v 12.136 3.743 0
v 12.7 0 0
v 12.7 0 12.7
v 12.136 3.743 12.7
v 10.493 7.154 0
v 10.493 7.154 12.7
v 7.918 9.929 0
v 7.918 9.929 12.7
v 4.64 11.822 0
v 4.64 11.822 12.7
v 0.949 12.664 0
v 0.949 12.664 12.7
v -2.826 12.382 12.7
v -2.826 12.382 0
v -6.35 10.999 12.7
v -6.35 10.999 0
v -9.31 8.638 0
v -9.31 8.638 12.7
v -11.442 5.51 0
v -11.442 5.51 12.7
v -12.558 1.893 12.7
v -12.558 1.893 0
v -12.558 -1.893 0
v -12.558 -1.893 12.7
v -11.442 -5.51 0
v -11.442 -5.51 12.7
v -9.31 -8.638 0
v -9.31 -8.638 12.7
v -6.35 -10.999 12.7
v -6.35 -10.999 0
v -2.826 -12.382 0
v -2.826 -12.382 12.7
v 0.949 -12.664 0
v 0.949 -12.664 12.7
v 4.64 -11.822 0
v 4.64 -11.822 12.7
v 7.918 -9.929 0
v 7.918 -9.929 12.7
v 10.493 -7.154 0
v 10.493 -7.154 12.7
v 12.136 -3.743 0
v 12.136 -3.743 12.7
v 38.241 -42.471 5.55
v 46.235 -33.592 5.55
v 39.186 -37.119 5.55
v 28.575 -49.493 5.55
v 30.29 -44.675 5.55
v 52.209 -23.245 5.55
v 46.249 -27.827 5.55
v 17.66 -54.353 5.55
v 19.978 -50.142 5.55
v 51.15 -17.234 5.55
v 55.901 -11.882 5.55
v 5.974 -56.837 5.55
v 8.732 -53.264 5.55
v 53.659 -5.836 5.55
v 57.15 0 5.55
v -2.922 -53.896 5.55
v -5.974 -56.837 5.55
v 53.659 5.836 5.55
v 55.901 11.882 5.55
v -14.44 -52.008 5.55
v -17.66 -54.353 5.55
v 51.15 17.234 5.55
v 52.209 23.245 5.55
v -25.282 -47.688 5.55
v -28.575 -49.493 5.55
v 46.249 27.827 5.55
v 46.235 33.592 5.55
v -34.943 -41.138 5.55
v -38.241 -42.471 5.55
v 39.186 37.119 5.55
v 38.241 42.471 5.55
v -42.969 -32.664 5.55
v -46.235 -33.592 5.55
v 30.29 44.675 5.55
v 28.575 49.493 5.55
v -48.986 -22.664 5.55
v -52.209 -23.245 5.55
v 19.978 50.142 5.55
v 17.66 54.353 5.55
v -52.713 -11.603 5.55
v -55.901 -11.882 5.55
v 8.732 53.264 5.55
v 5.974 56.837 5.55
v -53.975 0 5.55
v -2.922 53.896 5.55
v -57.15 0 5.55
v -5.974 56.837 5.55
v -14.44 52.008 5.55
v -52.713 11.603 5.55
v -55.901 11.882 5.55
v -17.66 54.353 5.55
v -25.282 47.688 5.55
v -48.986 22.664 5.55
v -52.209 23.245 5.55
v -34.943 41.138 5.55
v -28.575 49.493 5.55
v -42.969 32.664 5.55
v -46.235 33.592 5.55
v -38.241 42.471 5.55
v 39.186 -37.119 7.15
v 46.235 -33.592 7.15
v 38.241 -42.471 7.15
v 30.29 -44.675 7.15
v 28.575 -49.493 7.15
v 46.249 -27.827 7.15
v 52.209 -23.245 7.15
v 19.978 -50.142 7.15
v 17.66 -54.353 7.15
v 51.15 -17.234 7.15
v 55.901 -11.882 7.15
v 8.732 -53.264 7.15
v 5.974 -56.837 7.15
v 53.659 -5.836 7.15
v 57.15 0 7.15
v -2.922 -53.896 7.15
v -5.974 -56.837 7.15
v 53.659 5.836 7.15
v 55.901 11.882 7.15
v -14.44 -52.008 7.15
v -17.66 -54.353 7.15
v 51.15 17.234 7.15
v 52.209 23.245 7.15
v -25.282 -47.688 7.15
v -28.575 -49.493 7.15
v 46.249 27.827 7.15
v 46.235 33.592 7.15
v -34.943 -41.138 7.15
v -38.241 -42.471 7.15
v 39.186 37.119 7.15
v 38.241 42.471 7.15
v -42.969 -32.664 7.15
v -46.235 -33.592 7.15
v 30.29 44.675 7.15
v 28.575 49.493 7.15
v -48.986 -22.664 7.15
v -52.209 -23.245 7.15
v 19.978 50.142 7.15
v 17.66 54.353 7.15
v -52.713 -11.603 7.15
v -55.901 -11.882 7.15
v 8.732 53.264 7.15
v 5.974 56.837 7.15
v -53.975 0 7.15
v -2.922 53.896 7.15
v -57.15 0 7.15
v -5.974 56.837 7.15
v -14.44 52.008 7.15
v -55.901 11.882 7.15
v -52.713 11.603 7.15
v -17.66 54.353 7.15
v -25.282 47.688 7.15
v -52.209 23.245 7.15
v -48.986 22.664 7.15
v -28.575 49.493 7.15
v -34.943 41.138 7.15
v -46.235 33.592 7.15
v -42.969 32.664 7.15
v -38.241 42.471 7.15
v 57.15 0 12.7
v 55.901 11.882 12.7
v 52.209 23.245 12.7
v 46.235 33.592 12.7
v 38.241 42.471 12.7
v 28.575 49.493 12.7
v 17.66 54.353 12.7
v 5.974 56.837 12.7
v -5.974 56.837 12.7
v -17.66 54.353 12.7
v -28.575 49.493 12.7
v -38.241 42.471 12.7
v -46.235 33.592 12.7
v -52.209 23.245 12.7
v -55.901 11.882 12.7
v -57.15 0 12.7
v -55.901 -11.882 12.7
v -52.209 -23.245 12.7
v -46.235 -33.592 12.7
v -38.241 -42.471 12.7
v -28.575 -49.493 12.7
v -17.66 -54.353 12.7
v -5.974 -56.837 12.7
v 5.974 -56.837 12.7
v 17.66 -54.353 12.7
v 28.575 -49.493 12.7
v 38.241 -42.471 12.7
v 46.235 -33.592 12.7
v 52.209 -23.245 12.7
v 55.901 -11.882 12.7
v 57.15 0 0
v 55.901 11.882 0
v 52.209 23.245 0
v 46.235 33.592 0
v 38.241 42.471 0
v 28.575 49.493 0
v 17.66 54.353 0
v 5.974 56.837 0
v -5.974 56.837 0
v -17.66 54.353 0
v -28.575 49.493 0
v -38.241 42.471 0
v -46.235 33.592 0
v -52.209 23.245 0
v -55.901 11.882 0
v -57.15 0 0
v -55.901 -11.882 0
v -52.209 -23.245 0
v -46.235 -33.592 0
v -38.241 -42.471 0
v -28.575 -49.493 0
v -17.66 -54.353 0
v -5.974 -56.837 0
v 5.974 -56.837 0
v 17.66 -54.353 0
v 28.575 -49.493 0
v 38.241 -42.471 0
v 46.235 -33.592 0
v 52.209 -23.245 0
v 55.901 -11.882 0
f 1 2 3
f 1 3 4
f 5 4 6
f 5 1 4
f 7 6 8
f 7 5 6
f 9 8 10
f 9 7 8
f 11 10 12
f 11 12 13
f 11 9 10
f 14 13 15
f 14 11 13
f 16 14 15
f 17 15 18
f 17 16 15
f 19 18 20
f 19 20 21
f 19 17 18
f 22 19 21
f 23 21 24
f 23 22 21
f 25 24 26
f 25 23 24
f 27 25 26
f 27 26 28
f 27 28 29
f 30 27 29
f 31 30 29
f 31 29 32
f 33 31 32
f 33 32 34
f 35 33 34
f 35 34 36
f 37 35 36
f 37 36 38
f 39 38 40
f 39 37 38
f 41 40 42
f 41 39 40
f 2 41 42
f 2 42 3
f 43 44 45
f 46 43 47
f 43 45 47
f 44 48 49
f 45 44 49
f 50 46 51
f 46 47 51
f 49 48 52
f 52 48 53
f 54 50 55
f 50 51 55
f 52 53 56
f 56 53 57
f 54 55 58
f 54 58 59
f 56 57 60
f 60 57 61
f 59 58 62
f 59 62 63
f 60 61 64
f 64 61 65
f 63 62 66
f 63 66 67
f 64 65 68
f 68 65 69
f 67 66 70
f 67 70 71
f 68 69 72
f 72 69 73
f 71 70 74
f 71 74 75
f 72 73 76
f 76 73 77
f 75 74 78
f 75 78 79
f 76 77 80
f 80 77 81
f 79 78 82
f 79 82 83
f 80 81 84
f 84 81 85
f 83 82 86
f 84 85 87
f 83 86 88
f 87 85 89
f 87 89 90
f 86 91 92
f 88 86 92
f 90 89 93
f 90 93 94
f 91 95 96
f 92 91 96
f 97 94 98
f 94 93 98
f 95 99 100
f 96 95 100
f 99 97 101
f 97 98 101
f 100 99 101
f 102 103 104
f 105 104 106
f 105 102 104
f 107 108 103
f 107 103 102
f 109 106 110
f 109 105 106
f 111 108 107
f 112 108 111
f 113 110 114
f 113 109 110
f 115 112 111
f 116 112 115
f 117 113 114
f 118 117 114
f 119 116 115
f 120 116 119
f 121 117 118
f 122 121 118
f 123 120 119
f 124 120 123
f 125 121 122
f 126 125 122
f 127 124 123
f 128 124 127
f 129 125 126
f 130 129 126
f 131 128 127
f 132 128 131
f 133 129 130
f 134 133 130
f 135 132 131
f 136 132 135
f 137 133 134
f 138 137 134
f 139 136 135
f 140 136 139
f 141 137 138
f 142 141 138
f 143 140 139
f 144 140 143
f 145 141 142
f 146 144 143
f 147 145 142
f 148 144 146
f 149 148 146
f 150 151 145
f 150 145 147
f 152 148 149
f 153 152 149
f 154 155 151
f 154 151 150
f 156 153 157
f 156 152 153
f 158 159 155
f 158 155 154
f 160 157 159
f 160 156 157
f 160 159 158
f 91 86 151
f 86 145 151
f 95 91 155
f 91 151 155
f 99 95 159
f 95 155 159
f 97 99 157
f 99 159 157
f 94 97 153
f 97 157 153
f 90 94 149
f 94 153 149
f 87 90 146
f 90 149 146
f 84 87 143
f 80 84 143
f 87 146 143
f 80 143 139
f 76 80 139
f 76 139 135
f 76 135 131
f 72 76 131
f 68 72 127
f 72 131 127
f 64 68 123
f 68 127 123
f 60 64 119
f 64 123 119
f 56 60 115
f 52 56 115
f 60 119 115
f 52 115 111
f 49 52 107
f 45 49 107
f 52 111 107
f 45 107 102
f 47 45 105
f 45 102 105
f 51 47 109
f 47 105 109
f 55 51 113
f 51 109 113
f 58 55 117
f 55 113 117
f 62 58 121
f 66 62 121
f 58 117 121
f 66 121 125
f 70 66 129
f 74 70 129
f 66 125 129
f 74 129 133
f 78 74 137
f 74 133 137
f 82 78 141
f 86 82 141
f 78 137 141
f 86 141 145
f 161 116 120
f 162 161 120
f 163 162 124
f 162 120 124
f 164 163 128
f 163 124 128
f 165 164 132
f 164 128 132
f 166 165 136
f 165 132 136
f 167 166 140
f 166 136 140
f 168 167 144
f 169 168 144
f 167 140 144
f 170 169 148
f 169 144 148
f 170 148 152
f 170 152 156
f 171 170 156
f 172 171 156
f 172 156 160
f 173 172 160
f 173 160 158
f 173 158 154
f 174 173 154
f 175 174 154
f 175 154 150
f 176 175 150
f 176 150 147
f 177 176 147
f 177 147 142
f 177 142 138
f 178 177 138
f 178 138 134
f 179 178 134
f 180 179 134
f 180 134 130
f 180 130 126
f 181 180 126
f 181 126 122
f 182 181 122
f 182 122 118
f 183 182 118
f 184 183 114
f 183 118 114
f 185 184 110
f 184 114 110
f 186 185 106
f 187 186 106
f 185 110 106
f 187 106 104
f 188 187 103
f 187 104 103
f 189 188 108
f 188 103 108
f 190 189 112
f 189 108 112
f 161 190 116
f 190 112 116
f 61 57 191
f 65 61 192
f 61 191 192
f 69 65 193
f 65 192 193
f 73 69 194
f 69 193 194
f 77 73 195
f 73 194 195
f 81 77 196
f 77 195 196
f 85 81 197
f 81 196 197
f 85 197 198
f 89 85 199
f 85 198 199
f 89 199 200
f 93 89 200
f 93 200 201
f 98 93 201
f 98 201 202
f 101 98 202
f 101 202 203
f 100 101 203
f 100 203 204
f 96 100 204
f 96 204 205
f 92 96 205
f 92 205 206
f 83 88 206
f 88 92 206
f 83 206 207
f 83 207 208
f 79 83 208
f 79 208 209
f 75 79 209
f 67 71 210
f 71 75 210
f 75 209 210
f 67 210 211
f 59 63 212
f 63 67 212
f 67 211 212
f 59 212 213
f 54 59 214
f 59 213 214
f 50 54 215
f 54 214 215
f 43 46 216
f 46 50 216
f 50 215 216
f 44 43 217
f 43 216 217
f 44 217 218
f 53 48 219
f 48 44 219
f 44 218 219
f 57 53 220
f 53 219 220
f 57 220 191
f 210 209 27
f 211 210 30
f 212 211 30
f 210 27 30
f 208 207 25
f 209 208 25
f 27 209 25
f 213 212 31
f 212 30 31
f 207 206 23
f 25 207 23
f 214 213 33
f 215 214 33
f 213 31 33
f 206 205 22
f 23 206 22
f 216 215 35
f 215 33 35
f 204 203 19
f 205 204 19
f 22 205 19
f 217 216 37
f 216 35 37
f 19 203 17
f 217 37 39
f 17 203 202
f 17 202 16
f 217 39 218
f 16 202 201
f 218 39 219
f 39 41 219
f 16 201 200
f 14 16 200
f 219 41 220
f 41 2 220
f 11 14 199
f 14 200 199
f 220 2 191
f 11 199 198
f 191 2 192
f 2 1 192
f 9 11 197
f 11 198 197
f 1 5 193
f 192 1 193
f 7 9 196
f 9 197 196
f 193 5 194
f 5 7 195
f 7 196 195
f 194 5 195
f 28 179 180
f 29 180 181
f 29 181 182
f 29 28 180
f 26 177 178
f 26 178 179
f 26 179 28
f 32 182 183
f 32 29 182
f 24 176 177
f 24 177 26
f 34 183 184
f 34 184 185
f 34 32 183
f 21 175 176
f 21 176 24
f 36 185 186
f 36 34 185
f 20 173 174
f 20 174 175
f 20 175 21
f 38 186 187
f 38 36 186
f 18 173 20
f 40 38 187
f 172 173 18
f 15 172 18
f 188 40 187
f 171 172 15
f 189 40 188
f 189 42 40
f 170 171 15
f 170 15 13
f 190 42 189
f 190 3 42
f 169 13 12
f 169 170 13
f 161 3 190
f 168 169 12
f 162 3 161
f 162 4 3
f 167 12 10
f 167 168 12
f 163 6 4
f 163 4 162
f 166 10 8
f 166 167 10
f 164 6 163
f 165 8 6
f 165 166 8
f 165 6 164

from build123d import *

# Parameters (mm, degrees)
SKETCH1_R           = 57.15
SKETCH1_R_2         = 12.7
BOSS_EXTRUDE1_DEPTH = 12.7
SKETCH3_R           = 57.15
SKETCH3_R_2         = 53.975
CUT_EXTRUDE1_DEPTH  = 0.8001


with BuildPart() as part:
    # Sketch1 → Boss-Extrude1 (new body)
    with BuildSketch(Plane.XY):
        Circle(SKETCH1_R)
        Circle(SKETCH1_R_2, mode=Mode.SUBTRACT)
    extrude(amount=BOSS_EXTRUDE1_DEPTH)

    # Sketch3 → Cut-Extrude1 (cut, symmetric)
    with BuildSketch(Plane(origin=(0, 0, 6.35), x_dir=(-1, 0, 0), z_dir=(0, 0, -1))):
        Circle(SKETCH3_R)
        Circle(SKETCH3_R_2, mode=Mode.SUBTRACT)
    extrude(amount=CUT_EXTRUDE1_DEPTH, both=True, mode=Mode.SUBTRACT)


solid = part.part
